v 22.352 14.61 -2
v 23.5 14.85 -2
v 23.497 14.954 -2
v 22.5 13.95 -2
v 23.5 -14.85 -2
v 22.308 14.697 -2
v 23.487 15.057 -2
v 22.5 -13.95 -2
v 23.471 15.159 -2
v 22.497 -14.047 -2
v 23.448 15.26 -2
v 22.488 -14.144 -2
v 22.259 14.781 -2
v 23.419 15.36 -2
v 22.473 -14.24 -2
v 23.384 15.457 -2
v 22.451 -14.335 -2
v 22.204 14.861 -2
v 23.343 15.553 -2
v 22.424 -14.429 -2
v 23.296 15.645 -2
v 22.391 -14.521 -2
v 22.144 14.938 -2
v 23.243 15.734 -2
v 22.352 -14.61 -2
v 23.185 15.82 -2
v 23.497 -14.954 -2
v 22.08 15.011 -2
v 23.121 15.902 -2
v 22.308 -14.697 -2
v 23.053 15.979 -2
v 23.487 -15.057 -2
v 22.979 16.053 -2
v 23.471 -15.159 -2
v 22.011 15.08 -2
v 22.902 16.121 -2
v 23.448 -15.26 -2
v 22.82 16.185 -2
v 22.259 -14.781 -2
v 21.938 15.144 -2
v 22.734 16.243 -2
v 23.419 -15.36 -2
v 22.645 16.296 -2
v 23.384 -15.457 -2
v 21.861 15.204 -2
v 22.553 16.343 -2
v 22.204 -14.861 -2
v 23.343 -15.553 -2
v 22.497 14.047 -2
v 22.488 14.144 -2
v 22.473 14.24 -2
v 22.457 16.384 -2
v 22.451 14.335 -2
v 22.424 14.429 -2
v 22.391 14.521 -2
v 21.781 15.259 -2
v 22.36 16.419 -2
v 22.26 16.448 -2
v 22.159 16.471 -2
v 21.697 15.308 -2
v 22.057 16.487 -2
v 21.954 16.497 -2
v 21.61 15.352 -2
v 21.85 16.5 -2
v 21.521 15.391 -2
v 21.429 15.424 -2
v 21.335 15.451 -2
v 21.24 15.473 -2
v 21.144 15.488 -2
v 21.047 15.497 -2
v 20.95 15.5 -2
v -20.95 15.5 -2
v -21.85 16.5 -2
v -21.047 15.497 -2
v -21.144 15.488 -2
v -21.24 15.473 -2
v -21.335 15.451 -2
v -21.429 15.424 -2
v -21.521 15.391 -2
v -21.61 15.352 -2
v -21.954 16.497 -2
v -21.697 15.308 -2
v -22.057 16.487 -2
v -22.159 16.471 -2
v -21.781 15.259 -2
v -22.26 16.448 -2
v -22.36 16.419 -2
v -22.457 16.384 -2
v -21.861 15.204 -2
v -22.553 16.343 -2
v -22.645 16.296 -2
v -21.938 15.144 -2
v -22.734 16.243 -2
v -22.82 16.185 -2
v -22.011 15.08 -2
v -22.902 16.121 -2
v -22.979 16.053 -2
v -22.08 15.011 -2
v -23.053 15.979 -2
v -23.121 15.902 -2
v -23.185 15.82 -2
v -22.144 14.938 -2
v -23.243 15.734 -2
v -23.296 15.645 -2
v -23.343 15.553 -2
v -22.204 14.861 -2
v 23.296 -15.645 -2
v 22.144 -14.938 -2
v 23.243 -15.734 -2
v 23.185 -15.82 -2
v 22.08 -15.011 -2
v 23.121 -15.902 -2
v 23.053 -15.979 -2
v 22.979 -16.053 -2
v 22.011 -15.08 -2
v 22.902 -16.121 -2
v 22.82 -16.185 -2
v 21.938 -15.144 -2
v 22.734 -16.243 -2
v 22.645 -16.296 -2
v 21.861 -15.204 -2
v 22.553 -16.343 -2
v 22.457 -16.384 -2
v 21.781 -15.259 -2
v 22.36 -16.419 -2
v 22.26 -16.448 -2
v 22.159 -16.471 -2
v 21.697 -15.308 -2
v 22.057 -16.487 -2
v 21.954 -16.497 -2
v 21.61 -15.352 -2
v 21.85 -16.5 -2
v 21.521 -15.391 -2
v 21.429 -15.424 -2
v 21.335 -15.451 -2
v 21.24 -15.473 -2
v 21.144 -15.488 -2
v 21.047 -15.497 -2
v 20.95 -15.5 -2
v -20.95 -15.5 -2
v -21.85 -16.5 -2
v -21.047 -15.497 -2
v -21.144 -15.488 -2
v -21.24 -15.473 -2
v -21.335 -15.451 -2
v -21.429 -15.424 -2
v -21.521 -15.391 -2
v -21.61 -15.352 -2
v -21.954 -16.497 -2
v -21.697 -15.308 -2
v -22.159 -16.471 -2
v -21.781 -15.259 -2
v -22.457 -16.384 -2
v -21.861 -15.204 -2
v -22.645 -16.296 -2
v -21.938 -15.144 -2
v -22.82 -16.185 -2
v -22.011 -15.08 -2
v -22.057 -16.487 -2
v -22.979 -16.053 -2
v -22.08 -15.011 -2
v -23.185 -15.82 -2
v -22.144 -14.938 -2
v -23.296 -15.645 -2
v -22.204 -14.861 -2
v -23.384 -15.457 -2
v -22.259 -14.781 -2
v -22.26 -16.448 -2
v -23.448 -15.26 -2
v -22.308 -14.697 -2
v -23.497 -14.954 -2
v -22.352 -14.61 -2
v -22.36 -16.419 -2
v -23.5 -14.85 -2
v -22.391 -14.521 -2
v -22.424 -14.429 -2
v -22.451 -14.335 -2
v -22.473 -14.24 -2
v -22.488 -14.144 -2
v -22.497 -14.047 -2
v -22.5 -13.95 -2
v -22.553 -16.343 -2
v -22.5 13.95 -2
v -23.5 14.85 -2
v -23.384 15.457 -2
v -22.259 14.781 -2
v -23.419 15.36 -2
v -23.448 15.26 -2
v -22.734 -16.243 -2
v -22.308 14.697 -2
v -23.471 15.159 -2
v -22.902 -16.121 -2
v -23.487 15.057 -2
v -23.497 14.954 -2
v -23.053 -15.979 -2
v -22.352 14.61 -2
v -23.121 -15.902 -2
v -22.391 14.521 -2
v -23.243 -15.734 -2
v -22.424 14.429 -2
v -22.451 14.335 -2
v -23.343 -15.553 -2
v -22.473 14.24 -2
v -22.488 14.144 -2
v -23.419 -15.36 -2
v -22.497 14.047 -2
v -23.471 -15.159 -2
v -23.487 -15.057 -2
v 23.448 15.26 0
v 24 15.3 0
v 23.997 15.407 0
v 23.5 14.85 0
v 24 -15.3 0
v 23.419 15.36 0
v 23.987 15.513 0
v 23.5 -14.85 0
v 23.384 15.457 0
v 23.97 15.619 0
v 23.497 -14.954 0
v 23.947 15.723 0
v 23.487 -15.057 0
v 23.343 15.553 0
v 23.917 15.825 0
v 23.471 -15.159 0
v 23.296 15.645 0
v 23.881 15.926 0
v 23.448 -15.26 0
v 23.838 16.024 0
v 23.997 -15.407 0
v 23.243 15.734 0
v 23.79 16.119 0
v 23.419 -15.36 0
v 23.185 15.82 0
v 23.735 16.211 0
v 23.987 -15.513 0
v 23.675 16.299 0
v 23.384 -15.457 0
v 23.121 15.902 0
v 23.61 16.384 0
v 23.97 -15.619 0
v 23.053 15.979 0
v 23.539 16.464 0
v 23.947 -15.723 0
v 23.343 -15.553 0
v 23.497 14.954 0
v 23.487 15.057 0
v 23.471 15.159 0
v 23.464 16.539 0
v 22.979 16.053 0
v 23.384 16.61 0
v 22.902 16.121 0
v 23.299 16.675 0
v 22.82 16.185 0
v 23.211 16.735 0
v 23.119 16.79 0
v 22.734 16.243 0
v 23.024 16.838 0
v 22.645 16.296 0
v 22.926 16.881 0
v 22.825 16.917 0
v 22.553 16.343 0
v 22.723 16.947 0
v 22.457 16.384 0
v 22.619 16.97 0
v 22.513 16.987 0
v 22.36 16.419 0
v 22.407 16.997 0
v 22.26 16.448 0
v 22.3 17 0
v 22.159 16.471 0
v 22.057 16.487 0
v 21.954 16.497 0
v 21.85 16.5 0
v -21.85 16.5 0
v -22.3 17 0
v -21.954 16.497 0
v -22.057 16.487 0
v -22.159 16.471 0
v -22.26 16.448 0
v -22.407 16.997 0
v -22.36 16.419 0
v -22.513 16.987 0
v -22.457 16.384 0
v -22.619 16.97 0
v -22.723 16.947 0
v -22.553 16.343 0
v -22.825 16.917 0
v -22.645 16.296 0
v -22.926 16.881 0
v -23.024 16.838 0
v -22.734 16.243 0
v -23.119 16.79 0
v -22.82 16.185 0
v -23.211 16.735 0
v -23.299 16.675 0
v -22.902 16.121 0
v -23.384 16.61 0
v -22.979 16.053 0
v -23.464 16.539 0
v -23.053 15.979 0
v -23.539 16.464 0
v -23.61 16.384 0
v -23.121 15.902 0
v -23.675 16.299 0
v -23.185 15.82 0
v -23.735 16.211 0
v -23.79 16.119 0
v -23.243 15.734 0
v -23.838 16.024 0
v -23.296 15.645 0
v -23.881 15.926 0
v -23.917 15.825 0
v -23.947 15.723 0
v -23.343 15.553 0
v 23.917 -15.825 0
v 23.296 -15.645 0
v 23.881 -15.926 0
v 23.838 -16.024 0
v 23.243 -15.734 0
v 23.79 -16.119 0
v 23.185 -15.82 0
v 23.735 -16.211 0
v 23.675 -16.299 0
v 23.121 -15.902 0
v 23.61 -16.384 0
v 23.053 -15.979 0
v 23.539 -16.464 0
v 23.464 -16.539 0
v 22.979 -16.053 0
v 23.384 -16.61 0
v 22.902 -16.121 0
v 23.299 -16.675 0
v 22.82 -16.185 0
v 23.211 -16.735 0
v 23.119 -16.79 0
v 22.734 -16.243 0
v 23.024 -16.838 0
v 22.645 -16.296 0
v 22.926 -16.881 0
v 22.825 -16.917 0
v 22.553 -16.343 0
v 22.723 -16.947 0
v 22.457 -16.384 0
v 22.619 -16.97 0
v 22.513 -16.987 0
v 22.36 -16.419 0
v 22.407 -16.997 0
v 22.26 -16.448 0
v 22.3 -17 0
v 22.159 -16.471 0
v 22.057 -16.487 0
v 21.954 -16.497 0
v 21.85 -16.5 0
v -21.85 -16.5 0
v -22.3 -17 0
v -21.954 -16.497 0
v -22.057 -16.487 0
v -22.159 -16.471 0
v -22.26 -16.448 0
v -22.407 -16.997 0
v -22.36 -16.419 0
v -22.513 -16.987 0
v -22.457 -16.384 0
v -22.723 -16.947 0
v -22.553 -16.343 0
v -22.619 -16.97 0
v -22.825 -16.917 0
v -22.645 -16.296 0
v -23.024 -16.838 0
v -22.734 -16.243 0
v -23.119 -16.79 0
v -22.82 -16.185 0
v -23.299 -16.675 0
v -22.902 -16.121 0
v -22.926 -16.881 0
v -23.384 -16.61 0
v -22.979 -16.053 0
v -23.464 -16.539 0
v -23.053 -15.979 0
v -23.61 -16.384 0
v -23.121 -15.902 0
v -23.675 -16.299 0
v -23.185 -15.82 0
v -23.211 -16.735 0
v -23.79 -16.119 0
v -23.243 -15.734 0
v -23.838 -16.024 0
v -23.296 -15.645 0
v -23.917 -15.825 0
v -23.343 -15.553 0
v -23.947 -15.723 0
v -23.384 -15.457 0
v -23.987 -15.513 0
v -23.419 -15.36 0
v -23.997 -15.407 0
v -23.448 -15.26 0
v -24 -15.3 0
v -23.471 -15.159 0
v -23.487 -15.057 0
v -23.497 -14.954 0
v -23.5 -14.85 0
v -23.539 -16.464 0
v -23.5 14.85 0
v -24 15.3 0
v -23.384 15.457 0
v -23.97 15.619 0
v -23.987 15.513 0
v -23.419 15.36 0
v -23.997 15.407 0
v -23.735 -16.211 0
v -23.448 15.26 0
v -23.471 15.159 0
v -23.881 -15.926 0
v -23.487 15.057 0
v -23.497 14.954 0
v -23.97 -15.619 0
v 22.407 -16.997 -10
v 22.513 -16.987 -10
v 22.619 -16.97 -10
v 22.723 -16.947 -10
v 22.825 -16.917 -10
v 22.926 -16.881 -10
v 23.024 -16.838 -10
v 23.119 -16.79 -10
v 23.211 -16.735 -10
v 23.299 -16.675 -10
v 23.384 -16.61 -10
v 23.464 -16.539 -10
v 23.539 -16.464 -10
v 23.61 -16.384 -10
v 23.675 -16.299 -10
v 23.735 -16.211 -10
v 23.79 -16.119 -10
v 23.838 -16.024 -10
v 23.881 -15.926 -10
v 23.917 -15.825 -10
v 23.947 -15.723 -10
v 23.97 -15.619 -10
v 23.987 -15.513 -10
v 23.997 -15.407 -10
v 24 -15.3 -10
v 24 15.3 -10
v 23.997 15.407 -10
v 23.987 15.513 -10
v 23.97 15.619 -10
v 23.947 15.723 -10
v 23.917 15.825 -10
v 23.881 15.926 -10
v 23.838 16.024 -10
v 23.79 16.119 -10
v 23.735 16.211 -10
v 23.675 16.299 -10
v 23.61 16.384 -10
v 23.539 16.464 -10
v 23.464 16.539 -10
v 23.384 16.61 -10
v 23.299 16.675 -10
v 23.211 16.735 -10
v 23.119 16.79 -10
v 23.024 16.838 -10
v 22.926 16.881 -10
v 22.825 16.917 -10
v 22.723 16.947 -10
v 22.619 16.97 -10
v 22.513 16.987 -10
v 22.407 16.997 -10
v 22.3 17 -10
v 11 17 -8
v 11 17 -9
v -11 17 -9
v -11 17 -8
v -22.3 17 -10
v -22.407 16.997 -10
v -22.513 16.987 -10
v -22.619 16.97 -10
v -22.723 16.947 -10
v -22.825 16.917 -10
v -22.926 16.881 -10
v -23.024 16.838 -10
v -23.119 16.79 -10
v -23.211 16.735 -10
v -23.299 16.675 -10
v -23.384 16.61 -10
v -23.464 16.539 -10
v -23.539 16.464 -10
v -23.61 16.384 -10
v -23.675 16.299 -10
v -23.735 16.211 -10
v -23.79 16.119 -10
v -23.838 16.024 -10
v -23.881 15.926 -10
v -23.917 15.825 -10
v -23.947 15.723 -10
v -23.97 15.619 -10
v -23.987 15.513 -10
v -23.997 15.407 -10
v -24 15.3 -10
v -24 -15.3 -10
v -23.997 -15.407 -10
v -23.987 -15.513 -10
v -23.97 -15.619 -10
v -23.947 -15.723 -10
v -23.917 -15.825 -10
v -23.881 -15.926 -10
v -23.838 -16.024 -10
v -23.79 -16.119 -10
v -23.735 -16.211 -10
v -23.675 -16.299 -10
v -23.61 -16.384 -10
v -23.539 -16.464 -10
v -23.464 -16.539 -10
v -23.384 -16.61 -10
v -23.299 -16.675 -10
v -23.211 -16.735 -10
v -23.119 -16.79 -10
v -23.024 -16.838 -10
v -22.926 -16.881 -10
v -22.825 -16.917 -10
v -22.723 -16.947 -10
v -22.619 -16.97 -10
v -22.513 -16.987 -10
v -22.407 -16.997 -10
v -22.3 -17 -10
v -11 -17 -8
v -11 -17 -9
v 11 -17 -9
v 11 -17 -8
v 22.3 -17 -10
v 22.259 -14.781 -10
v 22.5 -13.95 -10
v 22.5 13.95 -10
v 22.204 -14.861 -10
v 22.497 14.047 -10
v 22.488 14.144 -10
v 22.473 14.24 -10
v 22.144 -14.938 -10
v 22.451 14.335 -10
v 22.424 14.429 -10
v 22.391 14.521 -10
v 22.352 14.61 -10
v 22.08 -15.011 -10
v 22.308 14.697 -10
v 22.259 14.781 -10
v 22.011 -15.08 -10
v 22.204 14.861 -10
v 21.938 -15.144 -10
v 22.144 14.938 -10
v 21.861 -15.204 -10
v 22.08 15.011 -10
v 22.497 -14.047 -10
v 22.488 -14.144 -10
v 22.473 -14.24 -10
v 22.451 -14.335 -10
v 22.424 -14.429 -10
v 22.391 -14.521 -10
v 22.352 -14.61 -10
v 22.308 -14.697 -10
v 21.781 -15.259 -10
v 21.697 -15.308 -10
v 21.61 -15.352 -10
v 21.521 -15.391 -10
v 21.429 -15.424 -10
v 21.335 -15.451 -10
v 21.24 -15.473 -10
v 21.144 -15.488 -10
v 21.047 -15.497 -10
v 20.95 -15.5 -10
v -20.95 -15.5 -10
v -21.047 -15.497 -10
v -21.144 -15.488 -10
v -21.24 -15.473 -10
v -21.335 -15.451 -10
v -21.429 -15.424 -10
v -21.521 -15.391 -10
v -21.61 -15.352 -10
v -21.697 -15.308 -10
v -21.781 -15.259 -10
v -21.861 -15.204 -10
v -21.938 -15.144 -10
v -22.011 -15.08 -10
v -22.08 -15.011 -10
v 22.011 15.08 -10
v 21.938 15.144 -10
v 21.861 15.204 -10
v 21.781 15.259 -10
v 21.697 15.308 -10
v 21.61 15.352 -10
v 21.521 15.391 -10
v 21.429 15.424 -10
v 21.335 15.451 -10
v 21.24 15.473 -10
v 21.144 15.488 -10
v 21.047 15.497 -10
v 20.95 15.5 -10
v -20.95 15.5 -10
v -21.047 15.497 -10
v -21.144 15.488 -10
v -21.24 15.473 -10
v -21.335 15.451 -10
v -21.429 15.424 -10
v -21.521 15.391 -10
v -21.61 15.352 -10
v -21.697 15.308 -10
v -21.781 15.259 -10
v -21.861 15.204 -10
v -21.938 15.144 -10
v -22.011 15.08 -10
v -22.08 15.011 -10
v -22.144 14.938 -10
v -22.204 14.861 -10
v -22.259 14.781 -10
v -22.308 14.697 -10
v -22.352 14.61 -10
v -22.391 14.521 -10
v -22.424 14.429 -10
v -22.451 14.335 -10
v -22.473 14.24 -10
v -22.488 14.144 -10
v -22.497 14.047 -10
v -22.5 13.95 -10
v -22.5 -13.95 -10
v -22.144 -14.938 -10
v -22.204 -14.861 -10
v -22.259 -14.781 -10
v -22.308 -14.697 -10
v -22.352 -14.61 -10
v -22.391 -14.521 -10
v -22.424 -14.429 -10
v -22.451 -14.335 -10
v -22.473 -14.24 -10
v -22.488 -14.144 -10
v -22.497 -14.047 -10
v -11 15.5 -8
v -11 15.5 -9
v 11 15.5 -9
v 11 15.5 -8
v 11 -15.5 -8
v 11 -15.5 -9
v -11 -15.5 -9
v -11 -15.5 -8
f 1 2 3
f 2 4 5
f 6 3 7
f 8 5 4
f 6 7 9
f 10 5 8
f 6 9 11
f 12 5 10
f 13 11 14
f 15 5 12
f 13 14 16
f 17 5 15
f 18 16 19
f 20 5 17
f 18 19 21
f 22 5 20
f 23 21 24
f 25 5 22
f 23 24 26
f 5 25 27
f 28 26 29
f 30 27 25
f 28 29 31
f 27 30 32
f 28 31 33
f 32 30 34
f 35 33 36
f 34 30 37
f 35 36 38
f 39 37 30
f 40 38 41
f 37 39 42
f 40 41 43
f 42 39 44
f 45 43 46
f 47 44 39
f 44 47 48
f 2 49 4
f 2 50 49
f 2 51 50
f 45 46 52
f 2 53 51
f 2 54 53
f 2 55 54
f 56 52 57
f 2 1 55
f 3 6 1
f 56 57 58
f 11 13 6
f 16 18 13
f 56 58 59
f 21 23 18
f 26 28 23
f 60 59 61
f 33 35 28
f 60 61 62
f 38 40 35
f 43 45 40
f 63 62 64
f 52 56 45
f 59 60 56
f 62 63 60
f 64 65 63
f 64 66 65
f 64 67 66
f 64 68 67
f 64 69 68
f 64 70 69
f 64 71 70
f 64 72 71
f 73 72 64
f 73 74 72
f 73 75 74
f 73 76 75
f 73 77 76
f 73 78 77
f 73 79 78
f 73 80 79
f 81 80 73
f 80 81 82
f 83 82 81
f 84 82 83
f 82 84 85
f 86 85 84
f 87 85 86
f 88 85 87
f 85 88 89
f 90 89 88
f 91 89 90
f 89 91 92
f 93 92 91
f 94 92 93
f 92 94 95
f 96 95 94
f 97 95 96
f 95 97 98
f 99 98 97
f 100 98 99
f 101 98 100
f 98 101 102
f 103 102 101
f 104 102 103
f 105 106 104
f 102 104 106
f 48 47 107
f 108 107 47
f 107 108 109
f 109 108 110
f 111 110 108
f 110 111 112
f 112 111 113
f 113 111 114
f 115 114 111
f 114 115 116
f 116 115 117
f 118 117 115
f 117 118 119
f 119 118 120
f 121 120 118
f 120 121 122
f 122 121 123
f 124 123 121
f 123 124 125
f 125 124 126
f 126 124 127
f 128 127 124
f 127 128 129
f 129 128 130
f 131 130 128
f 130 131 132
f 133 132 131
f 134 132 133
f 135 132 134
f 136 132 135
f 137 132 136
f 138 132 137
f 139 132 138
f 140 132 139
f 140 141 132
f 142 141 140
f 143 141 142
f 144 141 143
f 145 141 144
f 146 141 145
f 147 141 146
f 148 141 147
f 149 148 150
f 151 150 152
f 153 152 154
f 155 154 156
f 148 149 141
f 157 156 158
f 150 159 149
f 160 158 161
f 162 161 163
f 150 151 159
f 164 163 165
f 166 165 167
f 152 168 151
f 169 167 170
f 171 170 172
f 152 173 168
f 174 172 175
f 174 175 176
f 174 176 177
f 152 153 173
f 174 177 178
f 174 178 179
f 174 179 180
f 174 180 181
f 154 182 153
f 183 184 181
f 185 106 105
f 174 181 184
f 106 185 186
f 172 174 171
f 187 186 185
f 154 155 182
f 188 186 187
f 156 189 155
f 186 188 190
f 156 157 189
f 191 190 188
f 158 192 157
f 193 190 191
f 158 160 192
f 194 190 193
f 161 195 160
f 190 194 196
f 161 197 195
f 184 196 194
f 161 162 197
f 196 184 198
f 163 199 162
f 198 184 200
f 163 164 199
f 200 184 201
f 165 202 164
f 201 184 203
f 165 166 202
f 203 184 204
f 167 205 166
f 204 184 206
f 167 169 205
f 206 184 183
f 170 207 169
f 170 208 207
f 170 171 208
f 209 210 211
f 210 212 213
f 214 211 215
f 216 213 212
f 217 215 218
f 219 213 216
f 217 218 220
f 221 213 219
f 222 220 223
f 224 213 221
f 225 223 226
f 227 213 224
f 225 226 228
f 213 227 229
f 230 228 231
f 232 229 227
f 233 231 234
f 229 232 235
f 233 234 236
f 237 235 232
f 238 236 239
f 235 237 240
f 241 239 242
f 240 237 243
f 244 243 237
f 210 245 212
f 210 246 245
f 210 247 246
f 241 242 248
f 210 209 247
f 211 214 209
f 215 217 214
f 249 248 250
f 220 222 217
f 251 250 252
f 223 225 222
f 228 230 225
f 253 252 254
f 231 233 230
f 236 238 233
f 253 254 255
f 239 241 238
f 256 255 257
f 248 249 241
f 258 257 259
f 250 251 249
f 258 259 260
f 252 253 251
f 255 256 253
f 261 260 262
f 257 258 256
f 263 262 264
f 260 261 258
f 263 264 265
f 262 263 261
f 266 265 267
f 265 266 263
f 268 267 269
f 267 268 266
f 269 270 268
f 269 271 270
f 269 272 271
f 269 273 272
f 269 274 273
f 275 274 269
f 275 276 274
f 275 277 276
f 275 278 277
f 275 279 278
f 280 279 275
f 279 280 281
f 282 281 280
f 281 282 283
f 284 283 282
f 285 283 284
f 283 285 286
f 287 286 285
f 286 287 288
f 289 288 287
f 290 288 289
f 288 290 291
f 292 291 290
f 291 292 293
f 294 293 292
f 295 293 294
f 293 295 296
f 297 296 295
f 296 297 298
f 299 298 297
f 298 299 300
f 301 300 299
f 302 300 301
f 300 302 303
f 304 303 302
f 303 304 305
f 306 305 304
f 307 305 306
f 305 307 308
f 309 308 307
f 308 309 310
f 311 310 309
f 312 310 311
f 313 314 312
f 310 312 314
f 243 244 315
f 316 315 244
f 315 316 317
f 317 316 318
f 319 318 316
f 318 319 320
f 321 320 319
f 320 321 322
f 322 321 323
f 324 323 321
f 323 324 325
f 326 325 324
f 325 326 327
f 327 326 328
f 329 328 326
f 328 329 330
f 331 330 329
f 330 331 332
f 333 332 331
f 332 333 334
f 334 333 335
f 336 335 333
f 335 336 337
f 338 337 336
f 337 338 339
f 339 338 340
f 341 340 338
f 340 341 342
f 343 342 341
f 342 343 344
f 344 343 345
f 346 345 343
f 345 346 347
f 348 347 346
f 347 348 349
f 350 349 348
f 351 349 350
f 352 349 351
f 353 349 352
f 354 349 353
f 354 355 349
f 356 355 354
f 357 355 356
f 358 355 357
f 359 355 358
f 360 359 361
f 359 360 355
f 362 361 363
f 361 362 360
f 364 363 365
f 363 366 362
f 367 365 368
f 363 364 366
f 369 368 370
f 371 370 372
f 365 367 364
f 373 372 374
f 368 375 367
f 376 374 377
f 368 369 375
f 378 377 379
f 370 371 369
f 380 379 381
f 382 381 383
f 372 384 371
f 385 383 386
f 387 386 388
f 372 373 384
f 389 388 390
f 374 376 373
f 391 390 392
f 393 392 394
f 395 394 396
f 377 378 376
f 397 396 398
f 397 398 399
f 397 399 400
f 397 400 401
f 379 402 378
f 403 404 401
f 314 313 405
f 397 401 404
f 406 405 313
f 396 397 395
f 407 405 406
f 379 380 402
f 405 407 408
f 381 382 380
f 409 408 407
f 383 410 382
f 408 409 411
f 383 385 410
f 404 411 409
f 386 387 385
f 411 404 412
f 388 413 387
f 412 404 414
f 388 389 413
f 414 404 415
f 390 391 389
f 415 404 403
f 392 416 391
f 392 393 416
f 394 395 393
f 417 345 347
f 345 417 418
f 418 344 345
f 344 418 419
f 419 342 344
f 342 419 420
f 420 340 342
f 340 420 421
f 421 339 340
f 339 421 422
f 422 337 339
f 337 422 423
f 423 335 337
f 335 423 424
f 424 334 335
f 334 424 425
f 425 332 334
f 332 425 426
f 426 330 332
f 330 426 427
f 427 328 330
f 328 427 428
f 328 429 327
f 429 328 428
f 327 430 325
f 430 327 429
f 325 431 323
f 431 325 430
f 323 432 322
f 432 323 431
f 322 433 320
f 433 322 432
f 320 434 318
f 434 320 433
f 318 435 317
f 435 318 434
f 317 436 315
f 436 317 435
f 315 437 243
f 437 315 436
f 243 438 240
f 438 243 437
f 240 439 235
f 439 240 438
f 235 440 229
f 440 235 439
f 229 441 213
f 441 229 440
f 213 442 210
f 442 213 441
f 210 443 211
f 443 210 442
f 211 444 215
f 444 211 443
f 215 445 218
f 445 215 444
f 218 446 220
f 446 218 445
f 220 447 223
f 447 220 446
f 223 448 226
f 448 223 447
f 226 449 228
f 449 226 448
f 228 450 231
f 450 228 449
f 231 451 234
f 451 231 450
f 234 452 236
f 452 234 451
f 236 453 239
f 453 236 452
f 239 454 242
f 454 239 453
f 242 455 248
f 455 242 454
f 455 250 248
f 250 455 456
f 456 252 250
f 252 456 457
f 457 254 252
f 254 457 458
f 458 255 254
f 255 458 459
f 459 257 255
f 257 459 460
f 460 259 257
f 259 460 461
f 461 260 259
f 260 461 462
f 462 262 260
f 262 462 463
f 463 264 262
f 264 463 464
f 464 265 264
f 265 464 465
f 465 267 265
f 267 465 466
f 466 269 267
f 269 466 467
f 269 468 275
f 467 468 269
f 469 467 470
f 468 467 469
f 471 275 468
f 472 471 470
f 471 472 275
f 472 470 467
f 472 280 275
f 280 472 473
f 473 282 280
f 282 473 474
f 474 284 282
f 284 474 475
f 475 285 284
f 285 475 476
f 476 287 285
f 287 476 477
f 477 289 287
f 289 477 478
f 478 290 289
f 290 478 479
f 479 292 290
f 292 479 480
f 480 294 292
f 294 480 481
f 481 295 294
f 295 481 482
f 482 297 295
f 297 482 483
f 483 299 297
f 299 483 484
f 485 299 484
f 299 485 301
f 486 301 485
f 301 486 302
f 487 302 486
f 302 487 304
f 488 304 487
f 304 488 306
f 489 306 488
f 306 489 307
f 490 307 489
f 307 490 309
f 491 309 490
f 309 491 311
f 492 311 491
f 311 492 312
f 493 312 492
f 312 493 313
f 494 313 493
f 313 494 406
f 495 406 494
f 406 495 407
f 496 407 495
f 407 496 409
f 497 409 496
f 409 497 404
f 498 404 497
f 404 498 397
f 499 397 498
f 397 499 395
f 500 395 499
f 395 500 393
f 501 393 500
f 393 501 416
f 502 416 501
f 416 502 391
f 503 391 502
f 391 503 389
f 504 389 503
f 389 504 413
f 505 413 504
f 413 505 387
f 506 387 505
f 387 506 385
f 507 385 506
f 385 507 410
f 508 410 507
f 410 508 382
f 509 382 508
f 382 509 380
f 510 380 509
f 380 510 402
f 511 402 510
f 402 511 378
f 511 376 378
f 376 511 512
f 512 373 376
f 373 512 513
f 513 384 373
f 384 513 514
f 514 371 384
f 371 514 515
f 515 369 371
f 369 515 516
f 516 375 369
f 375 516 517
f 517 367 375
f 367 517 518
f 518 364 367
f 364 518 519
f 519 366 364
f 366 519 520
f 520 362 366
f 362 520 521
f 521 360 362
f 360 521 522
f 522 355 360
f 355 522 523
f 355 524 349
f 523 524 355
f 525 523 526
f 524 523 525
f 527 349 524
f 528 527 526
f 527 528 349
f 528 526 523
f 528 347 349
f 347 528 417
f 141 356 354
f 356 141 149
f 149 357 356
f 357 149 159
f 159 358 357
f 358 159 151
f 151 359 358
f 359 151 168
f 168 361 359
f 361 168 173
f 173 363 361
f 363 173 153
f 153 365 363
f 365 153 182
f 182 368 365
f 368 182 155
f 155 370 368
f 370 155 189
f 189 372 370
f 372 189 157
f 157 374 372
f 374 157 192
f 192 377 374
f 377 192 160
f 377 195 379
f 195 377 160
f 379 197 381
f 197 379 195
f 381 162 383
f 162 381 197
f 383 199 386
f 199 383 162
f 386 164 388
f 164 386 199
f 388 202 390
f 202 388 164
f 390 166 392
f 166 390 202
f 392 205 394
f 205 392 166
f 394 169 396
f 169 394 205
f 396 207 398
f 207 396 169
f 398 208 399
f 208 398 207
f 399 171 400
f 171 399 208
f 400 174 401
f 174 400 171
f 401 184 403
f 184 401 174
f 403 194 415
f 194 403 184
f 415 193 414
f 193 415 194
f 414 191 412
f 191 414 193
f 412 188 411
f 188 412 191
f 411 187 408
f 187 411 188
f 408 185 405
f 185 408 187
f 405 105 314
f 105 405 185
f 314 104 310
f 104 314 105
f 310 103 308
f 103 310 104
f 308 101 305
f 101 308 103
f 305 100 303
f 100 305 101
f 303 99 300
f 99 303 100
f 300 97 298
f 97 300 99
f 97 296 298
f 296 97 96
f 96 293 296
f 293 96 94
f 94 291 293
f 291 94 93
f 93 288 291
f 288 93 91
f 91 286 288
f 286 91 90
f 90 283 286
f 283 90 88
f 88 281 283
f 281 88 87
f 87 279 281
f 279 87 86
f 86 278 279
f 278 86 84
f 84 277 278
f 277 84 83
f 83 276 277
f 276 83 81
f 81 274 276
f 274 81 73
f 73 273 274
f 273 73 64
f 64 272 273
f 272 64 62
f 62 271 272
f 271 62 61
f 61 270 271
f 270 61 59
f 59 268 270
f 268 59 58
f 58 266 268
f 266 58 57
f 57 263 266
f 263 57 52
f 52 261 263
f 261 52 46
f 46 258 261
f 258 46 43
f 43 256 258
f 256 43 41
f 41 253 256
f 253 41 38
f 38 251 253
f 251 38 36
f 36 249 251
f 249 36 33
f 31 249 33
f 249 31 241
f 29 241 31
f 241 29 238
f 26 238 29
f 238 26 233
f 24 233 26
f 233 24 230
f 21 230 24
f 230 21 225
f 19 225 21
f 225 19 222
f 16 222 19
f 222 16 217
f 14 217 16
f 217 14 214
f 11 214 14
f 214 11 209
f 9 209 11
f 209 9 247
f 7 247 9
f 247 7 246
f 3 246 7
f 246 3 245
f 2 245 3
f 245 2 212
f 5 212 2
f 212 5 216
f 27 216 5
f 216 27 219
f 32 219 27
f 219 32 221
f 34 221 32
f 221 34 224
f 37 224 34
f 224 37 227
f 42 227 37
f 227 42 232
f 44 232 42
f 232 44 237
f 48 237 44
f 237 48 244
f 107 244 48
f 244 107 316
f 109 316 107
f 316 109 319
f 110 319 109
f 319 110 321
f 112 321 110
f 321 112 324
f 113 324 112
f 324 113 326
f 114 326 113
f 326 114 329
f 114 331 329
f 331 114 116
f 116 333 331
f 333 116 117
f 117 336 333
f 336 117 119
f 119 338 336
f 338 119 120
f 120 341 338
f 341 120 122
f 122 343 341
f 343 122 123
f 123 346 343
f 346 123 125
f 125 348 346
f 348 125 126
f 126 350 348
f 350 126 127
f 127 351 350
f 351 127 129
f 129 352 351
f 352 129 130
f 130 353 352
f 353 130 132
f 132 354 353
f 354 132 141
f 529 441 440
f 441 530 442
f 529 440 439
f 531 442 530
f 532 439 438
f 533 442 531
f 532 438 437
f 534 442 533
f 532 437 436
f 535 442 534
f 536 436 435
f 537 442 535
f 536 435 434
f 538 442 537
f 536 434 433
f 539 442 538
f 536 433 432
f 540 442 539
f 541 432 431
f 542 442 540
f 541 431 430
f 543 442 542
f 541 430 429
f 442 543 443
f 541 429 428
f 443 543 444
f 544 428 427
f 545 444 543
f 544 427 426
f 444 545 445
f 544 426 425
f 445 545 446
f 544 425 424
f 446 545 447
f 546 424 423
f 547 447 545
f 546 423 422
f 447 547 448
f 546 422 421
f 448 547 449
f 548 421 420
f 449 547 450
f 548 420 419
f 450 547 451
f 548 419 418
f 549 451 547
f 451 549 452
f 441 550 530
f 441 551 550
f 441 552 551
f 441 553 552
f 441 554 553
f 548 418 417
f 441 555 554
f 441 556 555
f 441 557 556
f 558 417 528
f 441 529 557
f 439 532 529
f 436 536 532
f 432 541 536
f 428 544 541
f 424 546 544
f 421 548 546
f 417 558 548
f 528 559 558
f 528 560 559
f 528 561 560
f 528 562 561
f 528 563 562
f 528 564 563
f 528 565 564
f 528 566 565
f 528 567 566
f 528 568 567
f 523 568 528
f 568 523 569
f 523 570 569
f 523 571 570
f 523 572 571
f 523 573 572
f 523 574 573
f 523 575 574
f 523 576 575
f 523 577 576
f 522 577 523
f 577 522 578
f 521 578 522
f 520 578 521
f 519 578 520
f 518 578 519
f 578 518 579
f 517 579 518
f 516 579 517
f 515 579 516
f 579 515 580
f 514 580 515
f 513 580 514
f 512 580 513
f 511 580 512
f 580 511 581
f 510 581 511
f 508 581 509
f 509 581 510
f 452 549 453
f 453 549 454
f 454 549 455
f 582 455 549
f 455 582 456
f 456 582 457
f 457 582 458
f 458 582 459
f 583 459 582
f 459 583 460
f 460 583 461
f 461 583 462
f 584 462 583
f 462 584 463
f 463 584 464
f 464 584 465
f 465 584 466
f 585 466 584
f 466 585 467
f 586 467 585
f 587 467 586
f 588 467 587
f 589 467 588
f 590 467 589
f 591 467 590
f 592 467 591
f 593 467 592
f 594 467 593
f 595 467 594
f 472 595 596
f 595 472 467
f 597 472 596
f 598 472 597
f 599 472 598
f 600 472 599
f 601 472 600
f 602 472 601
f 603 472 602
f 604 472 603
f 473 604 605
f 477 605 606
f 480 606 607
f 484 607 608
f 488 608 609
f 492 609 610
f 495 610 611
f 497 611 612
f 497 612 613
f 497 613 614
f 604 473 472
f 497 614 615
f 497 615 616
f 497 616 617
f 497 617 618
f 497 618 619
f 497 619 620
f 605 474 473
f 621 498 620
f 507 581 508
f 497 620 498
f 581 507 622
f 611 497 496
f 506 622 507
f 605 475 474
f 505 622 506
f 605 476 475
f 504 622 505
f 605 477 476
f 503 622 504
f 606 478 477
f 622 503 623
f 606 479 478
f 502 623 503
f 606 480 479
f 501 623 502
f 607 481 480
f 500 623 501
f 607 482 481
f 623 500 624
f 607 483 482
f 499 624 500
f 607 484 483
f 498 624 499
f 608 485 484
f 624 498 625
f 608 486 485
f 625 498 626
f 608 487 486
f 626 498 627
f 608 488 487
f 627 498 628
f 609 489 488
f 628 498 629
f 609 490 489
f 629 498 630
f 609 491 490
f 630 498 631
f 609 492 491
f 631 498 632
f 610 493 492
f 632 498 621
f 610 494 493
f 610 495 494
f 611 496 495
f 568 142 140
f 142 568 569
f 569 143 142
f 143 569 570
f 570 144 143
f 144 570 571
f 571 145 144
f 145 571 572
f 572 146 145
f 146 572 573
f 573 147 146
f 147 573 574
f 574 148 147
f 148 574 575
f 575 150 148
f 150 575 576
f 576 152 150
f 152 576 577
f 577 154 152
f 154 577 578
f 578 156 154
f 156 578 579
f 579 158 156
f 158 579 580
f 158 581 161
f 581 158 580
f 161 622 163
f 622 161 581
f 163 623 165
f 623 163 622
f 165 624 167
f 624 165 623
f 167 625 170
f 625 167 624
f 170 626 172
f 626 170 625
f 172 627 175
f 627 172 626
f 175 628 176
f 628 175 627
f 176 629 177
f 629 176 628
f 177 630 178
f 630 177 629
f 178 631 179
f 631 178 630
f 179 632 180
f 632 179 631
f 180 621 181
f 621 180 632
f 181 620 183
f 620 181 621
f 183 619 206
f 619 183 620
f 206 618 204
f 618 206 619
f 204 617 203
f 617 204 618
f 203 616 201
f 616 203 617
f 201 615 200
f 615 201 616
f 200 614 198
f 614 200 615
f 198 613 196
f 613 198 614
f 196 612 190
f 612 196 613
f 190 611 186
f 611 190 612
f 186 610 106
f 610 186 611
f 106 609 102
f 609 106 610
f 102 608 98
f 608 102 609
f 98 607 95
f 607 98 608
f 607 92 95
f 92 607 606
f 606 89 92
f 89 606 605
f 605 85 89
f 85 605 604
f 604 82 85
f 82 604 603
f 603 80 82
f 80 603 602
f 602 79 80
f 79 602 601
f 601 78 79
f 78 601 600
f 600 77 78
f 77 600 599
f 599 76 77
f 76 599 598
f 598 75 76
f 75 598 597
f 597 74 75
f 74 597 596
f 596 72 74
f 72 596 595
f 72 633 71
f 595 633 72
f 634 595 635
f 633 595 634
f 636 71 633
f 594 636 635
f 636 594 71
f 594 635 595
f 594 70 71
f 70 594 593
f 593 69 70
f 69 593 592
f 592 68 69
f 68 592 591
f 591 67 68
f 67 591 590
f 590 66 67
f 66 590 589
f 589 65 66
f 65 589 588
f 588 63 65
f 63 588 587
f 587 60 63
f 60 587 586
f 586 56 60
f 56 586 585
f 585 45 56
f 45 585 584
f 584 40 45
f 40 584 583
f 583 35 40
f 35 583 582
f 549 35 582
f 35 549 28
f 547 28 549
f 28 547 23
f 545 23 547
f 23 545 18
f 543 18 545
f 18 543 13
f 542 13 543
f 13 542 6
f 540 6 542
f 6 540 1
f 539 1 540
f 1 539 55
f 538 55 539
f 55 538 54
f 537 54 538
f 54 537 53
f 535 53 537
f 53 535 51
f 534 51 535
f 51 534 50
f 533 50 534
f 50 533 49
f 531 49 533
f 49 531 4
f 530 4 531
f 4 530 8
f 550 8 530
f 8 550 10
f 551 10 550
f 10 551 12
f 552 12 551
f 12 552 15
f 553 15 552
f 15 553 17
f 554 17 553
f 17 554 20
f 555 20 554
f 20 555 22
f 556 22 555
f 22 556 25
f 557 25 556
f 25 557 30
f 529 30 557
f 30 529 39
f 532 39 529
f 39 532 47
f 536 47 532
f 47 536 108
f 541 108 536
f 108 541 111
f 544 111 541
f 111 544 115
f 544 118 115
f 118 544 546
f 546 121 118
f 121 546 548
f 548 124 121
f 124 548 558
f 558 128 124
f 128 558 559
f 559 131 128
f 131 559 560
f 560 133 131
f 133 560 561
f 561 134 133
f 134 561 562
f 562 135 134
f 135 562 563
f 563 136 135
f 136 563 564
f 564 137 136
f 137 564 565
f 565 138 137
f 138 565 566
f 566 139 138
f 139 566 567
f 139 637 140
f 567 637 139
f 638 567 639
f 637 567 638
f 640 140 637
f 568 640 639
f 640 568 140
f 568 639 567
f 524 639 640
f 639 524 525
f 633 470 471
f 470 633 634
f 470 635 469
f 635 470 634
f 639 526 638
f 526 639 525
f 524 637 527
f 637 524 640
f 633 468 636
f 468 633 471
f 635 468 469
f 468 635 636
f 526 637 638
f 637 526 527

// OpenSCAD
// file: unwatch_parameters.scad
board_w = 47;
board_h = 33;
board_thickness = 2;

outer_lip = 0.5;
inner_lip = 2;

case_thickness = 8;

band_w = 22;
band_h = 1;

module lug_slot() {
    h = board_h+outer_lip*2;
    translate([0, 0, band_h/2])
    rotate([90, 0, 0]) 
    translate([0, 0, -h/2]) 
    rotate([0, 0, 90])
    linear_extrude(board_h+outer_lip*2) 
        square([band_h, band_w], true);
}
// file: rounded_rectangle.scad
module rounded_rectangle(w, h) {
    r = min(w, h) * 0.05;
    $fn = 100;
    
    hull() {
        for (x = [-w/2+r, w/2-r]) {
            for (y = [-h/2+r, h/2-r]) {
                translate([x, y, 0]) circle(r);
            }
        }
    }
}
// main file
include <rounded_rectangle.scad>;
include <unwatch_parameters.scad>;

module case() {
    translate([0, 0, -board_thickness])
    linear_extrude(board_thickness) 
    difference() {
        rounded_rectangle(board_w+outer_lip*2, board_h+outer_lip*2);
        rounded_rectangle(board_w, board_h);
    }

    translate([0, 0, -case_thickness-board_thickness])
    linear_extrude(case_thickness)
    difference() {
        rounded_rectangle(board_w+outer_lip*2, board_h+outer_lip*2);
        rounded_rectangle(board_w-inner_lip, board_h-inner_lip);
    }
}

difference() {
    case();
    translate([0, 0, -case_thickness-board_thickness+1])
        lug_slot();
}
